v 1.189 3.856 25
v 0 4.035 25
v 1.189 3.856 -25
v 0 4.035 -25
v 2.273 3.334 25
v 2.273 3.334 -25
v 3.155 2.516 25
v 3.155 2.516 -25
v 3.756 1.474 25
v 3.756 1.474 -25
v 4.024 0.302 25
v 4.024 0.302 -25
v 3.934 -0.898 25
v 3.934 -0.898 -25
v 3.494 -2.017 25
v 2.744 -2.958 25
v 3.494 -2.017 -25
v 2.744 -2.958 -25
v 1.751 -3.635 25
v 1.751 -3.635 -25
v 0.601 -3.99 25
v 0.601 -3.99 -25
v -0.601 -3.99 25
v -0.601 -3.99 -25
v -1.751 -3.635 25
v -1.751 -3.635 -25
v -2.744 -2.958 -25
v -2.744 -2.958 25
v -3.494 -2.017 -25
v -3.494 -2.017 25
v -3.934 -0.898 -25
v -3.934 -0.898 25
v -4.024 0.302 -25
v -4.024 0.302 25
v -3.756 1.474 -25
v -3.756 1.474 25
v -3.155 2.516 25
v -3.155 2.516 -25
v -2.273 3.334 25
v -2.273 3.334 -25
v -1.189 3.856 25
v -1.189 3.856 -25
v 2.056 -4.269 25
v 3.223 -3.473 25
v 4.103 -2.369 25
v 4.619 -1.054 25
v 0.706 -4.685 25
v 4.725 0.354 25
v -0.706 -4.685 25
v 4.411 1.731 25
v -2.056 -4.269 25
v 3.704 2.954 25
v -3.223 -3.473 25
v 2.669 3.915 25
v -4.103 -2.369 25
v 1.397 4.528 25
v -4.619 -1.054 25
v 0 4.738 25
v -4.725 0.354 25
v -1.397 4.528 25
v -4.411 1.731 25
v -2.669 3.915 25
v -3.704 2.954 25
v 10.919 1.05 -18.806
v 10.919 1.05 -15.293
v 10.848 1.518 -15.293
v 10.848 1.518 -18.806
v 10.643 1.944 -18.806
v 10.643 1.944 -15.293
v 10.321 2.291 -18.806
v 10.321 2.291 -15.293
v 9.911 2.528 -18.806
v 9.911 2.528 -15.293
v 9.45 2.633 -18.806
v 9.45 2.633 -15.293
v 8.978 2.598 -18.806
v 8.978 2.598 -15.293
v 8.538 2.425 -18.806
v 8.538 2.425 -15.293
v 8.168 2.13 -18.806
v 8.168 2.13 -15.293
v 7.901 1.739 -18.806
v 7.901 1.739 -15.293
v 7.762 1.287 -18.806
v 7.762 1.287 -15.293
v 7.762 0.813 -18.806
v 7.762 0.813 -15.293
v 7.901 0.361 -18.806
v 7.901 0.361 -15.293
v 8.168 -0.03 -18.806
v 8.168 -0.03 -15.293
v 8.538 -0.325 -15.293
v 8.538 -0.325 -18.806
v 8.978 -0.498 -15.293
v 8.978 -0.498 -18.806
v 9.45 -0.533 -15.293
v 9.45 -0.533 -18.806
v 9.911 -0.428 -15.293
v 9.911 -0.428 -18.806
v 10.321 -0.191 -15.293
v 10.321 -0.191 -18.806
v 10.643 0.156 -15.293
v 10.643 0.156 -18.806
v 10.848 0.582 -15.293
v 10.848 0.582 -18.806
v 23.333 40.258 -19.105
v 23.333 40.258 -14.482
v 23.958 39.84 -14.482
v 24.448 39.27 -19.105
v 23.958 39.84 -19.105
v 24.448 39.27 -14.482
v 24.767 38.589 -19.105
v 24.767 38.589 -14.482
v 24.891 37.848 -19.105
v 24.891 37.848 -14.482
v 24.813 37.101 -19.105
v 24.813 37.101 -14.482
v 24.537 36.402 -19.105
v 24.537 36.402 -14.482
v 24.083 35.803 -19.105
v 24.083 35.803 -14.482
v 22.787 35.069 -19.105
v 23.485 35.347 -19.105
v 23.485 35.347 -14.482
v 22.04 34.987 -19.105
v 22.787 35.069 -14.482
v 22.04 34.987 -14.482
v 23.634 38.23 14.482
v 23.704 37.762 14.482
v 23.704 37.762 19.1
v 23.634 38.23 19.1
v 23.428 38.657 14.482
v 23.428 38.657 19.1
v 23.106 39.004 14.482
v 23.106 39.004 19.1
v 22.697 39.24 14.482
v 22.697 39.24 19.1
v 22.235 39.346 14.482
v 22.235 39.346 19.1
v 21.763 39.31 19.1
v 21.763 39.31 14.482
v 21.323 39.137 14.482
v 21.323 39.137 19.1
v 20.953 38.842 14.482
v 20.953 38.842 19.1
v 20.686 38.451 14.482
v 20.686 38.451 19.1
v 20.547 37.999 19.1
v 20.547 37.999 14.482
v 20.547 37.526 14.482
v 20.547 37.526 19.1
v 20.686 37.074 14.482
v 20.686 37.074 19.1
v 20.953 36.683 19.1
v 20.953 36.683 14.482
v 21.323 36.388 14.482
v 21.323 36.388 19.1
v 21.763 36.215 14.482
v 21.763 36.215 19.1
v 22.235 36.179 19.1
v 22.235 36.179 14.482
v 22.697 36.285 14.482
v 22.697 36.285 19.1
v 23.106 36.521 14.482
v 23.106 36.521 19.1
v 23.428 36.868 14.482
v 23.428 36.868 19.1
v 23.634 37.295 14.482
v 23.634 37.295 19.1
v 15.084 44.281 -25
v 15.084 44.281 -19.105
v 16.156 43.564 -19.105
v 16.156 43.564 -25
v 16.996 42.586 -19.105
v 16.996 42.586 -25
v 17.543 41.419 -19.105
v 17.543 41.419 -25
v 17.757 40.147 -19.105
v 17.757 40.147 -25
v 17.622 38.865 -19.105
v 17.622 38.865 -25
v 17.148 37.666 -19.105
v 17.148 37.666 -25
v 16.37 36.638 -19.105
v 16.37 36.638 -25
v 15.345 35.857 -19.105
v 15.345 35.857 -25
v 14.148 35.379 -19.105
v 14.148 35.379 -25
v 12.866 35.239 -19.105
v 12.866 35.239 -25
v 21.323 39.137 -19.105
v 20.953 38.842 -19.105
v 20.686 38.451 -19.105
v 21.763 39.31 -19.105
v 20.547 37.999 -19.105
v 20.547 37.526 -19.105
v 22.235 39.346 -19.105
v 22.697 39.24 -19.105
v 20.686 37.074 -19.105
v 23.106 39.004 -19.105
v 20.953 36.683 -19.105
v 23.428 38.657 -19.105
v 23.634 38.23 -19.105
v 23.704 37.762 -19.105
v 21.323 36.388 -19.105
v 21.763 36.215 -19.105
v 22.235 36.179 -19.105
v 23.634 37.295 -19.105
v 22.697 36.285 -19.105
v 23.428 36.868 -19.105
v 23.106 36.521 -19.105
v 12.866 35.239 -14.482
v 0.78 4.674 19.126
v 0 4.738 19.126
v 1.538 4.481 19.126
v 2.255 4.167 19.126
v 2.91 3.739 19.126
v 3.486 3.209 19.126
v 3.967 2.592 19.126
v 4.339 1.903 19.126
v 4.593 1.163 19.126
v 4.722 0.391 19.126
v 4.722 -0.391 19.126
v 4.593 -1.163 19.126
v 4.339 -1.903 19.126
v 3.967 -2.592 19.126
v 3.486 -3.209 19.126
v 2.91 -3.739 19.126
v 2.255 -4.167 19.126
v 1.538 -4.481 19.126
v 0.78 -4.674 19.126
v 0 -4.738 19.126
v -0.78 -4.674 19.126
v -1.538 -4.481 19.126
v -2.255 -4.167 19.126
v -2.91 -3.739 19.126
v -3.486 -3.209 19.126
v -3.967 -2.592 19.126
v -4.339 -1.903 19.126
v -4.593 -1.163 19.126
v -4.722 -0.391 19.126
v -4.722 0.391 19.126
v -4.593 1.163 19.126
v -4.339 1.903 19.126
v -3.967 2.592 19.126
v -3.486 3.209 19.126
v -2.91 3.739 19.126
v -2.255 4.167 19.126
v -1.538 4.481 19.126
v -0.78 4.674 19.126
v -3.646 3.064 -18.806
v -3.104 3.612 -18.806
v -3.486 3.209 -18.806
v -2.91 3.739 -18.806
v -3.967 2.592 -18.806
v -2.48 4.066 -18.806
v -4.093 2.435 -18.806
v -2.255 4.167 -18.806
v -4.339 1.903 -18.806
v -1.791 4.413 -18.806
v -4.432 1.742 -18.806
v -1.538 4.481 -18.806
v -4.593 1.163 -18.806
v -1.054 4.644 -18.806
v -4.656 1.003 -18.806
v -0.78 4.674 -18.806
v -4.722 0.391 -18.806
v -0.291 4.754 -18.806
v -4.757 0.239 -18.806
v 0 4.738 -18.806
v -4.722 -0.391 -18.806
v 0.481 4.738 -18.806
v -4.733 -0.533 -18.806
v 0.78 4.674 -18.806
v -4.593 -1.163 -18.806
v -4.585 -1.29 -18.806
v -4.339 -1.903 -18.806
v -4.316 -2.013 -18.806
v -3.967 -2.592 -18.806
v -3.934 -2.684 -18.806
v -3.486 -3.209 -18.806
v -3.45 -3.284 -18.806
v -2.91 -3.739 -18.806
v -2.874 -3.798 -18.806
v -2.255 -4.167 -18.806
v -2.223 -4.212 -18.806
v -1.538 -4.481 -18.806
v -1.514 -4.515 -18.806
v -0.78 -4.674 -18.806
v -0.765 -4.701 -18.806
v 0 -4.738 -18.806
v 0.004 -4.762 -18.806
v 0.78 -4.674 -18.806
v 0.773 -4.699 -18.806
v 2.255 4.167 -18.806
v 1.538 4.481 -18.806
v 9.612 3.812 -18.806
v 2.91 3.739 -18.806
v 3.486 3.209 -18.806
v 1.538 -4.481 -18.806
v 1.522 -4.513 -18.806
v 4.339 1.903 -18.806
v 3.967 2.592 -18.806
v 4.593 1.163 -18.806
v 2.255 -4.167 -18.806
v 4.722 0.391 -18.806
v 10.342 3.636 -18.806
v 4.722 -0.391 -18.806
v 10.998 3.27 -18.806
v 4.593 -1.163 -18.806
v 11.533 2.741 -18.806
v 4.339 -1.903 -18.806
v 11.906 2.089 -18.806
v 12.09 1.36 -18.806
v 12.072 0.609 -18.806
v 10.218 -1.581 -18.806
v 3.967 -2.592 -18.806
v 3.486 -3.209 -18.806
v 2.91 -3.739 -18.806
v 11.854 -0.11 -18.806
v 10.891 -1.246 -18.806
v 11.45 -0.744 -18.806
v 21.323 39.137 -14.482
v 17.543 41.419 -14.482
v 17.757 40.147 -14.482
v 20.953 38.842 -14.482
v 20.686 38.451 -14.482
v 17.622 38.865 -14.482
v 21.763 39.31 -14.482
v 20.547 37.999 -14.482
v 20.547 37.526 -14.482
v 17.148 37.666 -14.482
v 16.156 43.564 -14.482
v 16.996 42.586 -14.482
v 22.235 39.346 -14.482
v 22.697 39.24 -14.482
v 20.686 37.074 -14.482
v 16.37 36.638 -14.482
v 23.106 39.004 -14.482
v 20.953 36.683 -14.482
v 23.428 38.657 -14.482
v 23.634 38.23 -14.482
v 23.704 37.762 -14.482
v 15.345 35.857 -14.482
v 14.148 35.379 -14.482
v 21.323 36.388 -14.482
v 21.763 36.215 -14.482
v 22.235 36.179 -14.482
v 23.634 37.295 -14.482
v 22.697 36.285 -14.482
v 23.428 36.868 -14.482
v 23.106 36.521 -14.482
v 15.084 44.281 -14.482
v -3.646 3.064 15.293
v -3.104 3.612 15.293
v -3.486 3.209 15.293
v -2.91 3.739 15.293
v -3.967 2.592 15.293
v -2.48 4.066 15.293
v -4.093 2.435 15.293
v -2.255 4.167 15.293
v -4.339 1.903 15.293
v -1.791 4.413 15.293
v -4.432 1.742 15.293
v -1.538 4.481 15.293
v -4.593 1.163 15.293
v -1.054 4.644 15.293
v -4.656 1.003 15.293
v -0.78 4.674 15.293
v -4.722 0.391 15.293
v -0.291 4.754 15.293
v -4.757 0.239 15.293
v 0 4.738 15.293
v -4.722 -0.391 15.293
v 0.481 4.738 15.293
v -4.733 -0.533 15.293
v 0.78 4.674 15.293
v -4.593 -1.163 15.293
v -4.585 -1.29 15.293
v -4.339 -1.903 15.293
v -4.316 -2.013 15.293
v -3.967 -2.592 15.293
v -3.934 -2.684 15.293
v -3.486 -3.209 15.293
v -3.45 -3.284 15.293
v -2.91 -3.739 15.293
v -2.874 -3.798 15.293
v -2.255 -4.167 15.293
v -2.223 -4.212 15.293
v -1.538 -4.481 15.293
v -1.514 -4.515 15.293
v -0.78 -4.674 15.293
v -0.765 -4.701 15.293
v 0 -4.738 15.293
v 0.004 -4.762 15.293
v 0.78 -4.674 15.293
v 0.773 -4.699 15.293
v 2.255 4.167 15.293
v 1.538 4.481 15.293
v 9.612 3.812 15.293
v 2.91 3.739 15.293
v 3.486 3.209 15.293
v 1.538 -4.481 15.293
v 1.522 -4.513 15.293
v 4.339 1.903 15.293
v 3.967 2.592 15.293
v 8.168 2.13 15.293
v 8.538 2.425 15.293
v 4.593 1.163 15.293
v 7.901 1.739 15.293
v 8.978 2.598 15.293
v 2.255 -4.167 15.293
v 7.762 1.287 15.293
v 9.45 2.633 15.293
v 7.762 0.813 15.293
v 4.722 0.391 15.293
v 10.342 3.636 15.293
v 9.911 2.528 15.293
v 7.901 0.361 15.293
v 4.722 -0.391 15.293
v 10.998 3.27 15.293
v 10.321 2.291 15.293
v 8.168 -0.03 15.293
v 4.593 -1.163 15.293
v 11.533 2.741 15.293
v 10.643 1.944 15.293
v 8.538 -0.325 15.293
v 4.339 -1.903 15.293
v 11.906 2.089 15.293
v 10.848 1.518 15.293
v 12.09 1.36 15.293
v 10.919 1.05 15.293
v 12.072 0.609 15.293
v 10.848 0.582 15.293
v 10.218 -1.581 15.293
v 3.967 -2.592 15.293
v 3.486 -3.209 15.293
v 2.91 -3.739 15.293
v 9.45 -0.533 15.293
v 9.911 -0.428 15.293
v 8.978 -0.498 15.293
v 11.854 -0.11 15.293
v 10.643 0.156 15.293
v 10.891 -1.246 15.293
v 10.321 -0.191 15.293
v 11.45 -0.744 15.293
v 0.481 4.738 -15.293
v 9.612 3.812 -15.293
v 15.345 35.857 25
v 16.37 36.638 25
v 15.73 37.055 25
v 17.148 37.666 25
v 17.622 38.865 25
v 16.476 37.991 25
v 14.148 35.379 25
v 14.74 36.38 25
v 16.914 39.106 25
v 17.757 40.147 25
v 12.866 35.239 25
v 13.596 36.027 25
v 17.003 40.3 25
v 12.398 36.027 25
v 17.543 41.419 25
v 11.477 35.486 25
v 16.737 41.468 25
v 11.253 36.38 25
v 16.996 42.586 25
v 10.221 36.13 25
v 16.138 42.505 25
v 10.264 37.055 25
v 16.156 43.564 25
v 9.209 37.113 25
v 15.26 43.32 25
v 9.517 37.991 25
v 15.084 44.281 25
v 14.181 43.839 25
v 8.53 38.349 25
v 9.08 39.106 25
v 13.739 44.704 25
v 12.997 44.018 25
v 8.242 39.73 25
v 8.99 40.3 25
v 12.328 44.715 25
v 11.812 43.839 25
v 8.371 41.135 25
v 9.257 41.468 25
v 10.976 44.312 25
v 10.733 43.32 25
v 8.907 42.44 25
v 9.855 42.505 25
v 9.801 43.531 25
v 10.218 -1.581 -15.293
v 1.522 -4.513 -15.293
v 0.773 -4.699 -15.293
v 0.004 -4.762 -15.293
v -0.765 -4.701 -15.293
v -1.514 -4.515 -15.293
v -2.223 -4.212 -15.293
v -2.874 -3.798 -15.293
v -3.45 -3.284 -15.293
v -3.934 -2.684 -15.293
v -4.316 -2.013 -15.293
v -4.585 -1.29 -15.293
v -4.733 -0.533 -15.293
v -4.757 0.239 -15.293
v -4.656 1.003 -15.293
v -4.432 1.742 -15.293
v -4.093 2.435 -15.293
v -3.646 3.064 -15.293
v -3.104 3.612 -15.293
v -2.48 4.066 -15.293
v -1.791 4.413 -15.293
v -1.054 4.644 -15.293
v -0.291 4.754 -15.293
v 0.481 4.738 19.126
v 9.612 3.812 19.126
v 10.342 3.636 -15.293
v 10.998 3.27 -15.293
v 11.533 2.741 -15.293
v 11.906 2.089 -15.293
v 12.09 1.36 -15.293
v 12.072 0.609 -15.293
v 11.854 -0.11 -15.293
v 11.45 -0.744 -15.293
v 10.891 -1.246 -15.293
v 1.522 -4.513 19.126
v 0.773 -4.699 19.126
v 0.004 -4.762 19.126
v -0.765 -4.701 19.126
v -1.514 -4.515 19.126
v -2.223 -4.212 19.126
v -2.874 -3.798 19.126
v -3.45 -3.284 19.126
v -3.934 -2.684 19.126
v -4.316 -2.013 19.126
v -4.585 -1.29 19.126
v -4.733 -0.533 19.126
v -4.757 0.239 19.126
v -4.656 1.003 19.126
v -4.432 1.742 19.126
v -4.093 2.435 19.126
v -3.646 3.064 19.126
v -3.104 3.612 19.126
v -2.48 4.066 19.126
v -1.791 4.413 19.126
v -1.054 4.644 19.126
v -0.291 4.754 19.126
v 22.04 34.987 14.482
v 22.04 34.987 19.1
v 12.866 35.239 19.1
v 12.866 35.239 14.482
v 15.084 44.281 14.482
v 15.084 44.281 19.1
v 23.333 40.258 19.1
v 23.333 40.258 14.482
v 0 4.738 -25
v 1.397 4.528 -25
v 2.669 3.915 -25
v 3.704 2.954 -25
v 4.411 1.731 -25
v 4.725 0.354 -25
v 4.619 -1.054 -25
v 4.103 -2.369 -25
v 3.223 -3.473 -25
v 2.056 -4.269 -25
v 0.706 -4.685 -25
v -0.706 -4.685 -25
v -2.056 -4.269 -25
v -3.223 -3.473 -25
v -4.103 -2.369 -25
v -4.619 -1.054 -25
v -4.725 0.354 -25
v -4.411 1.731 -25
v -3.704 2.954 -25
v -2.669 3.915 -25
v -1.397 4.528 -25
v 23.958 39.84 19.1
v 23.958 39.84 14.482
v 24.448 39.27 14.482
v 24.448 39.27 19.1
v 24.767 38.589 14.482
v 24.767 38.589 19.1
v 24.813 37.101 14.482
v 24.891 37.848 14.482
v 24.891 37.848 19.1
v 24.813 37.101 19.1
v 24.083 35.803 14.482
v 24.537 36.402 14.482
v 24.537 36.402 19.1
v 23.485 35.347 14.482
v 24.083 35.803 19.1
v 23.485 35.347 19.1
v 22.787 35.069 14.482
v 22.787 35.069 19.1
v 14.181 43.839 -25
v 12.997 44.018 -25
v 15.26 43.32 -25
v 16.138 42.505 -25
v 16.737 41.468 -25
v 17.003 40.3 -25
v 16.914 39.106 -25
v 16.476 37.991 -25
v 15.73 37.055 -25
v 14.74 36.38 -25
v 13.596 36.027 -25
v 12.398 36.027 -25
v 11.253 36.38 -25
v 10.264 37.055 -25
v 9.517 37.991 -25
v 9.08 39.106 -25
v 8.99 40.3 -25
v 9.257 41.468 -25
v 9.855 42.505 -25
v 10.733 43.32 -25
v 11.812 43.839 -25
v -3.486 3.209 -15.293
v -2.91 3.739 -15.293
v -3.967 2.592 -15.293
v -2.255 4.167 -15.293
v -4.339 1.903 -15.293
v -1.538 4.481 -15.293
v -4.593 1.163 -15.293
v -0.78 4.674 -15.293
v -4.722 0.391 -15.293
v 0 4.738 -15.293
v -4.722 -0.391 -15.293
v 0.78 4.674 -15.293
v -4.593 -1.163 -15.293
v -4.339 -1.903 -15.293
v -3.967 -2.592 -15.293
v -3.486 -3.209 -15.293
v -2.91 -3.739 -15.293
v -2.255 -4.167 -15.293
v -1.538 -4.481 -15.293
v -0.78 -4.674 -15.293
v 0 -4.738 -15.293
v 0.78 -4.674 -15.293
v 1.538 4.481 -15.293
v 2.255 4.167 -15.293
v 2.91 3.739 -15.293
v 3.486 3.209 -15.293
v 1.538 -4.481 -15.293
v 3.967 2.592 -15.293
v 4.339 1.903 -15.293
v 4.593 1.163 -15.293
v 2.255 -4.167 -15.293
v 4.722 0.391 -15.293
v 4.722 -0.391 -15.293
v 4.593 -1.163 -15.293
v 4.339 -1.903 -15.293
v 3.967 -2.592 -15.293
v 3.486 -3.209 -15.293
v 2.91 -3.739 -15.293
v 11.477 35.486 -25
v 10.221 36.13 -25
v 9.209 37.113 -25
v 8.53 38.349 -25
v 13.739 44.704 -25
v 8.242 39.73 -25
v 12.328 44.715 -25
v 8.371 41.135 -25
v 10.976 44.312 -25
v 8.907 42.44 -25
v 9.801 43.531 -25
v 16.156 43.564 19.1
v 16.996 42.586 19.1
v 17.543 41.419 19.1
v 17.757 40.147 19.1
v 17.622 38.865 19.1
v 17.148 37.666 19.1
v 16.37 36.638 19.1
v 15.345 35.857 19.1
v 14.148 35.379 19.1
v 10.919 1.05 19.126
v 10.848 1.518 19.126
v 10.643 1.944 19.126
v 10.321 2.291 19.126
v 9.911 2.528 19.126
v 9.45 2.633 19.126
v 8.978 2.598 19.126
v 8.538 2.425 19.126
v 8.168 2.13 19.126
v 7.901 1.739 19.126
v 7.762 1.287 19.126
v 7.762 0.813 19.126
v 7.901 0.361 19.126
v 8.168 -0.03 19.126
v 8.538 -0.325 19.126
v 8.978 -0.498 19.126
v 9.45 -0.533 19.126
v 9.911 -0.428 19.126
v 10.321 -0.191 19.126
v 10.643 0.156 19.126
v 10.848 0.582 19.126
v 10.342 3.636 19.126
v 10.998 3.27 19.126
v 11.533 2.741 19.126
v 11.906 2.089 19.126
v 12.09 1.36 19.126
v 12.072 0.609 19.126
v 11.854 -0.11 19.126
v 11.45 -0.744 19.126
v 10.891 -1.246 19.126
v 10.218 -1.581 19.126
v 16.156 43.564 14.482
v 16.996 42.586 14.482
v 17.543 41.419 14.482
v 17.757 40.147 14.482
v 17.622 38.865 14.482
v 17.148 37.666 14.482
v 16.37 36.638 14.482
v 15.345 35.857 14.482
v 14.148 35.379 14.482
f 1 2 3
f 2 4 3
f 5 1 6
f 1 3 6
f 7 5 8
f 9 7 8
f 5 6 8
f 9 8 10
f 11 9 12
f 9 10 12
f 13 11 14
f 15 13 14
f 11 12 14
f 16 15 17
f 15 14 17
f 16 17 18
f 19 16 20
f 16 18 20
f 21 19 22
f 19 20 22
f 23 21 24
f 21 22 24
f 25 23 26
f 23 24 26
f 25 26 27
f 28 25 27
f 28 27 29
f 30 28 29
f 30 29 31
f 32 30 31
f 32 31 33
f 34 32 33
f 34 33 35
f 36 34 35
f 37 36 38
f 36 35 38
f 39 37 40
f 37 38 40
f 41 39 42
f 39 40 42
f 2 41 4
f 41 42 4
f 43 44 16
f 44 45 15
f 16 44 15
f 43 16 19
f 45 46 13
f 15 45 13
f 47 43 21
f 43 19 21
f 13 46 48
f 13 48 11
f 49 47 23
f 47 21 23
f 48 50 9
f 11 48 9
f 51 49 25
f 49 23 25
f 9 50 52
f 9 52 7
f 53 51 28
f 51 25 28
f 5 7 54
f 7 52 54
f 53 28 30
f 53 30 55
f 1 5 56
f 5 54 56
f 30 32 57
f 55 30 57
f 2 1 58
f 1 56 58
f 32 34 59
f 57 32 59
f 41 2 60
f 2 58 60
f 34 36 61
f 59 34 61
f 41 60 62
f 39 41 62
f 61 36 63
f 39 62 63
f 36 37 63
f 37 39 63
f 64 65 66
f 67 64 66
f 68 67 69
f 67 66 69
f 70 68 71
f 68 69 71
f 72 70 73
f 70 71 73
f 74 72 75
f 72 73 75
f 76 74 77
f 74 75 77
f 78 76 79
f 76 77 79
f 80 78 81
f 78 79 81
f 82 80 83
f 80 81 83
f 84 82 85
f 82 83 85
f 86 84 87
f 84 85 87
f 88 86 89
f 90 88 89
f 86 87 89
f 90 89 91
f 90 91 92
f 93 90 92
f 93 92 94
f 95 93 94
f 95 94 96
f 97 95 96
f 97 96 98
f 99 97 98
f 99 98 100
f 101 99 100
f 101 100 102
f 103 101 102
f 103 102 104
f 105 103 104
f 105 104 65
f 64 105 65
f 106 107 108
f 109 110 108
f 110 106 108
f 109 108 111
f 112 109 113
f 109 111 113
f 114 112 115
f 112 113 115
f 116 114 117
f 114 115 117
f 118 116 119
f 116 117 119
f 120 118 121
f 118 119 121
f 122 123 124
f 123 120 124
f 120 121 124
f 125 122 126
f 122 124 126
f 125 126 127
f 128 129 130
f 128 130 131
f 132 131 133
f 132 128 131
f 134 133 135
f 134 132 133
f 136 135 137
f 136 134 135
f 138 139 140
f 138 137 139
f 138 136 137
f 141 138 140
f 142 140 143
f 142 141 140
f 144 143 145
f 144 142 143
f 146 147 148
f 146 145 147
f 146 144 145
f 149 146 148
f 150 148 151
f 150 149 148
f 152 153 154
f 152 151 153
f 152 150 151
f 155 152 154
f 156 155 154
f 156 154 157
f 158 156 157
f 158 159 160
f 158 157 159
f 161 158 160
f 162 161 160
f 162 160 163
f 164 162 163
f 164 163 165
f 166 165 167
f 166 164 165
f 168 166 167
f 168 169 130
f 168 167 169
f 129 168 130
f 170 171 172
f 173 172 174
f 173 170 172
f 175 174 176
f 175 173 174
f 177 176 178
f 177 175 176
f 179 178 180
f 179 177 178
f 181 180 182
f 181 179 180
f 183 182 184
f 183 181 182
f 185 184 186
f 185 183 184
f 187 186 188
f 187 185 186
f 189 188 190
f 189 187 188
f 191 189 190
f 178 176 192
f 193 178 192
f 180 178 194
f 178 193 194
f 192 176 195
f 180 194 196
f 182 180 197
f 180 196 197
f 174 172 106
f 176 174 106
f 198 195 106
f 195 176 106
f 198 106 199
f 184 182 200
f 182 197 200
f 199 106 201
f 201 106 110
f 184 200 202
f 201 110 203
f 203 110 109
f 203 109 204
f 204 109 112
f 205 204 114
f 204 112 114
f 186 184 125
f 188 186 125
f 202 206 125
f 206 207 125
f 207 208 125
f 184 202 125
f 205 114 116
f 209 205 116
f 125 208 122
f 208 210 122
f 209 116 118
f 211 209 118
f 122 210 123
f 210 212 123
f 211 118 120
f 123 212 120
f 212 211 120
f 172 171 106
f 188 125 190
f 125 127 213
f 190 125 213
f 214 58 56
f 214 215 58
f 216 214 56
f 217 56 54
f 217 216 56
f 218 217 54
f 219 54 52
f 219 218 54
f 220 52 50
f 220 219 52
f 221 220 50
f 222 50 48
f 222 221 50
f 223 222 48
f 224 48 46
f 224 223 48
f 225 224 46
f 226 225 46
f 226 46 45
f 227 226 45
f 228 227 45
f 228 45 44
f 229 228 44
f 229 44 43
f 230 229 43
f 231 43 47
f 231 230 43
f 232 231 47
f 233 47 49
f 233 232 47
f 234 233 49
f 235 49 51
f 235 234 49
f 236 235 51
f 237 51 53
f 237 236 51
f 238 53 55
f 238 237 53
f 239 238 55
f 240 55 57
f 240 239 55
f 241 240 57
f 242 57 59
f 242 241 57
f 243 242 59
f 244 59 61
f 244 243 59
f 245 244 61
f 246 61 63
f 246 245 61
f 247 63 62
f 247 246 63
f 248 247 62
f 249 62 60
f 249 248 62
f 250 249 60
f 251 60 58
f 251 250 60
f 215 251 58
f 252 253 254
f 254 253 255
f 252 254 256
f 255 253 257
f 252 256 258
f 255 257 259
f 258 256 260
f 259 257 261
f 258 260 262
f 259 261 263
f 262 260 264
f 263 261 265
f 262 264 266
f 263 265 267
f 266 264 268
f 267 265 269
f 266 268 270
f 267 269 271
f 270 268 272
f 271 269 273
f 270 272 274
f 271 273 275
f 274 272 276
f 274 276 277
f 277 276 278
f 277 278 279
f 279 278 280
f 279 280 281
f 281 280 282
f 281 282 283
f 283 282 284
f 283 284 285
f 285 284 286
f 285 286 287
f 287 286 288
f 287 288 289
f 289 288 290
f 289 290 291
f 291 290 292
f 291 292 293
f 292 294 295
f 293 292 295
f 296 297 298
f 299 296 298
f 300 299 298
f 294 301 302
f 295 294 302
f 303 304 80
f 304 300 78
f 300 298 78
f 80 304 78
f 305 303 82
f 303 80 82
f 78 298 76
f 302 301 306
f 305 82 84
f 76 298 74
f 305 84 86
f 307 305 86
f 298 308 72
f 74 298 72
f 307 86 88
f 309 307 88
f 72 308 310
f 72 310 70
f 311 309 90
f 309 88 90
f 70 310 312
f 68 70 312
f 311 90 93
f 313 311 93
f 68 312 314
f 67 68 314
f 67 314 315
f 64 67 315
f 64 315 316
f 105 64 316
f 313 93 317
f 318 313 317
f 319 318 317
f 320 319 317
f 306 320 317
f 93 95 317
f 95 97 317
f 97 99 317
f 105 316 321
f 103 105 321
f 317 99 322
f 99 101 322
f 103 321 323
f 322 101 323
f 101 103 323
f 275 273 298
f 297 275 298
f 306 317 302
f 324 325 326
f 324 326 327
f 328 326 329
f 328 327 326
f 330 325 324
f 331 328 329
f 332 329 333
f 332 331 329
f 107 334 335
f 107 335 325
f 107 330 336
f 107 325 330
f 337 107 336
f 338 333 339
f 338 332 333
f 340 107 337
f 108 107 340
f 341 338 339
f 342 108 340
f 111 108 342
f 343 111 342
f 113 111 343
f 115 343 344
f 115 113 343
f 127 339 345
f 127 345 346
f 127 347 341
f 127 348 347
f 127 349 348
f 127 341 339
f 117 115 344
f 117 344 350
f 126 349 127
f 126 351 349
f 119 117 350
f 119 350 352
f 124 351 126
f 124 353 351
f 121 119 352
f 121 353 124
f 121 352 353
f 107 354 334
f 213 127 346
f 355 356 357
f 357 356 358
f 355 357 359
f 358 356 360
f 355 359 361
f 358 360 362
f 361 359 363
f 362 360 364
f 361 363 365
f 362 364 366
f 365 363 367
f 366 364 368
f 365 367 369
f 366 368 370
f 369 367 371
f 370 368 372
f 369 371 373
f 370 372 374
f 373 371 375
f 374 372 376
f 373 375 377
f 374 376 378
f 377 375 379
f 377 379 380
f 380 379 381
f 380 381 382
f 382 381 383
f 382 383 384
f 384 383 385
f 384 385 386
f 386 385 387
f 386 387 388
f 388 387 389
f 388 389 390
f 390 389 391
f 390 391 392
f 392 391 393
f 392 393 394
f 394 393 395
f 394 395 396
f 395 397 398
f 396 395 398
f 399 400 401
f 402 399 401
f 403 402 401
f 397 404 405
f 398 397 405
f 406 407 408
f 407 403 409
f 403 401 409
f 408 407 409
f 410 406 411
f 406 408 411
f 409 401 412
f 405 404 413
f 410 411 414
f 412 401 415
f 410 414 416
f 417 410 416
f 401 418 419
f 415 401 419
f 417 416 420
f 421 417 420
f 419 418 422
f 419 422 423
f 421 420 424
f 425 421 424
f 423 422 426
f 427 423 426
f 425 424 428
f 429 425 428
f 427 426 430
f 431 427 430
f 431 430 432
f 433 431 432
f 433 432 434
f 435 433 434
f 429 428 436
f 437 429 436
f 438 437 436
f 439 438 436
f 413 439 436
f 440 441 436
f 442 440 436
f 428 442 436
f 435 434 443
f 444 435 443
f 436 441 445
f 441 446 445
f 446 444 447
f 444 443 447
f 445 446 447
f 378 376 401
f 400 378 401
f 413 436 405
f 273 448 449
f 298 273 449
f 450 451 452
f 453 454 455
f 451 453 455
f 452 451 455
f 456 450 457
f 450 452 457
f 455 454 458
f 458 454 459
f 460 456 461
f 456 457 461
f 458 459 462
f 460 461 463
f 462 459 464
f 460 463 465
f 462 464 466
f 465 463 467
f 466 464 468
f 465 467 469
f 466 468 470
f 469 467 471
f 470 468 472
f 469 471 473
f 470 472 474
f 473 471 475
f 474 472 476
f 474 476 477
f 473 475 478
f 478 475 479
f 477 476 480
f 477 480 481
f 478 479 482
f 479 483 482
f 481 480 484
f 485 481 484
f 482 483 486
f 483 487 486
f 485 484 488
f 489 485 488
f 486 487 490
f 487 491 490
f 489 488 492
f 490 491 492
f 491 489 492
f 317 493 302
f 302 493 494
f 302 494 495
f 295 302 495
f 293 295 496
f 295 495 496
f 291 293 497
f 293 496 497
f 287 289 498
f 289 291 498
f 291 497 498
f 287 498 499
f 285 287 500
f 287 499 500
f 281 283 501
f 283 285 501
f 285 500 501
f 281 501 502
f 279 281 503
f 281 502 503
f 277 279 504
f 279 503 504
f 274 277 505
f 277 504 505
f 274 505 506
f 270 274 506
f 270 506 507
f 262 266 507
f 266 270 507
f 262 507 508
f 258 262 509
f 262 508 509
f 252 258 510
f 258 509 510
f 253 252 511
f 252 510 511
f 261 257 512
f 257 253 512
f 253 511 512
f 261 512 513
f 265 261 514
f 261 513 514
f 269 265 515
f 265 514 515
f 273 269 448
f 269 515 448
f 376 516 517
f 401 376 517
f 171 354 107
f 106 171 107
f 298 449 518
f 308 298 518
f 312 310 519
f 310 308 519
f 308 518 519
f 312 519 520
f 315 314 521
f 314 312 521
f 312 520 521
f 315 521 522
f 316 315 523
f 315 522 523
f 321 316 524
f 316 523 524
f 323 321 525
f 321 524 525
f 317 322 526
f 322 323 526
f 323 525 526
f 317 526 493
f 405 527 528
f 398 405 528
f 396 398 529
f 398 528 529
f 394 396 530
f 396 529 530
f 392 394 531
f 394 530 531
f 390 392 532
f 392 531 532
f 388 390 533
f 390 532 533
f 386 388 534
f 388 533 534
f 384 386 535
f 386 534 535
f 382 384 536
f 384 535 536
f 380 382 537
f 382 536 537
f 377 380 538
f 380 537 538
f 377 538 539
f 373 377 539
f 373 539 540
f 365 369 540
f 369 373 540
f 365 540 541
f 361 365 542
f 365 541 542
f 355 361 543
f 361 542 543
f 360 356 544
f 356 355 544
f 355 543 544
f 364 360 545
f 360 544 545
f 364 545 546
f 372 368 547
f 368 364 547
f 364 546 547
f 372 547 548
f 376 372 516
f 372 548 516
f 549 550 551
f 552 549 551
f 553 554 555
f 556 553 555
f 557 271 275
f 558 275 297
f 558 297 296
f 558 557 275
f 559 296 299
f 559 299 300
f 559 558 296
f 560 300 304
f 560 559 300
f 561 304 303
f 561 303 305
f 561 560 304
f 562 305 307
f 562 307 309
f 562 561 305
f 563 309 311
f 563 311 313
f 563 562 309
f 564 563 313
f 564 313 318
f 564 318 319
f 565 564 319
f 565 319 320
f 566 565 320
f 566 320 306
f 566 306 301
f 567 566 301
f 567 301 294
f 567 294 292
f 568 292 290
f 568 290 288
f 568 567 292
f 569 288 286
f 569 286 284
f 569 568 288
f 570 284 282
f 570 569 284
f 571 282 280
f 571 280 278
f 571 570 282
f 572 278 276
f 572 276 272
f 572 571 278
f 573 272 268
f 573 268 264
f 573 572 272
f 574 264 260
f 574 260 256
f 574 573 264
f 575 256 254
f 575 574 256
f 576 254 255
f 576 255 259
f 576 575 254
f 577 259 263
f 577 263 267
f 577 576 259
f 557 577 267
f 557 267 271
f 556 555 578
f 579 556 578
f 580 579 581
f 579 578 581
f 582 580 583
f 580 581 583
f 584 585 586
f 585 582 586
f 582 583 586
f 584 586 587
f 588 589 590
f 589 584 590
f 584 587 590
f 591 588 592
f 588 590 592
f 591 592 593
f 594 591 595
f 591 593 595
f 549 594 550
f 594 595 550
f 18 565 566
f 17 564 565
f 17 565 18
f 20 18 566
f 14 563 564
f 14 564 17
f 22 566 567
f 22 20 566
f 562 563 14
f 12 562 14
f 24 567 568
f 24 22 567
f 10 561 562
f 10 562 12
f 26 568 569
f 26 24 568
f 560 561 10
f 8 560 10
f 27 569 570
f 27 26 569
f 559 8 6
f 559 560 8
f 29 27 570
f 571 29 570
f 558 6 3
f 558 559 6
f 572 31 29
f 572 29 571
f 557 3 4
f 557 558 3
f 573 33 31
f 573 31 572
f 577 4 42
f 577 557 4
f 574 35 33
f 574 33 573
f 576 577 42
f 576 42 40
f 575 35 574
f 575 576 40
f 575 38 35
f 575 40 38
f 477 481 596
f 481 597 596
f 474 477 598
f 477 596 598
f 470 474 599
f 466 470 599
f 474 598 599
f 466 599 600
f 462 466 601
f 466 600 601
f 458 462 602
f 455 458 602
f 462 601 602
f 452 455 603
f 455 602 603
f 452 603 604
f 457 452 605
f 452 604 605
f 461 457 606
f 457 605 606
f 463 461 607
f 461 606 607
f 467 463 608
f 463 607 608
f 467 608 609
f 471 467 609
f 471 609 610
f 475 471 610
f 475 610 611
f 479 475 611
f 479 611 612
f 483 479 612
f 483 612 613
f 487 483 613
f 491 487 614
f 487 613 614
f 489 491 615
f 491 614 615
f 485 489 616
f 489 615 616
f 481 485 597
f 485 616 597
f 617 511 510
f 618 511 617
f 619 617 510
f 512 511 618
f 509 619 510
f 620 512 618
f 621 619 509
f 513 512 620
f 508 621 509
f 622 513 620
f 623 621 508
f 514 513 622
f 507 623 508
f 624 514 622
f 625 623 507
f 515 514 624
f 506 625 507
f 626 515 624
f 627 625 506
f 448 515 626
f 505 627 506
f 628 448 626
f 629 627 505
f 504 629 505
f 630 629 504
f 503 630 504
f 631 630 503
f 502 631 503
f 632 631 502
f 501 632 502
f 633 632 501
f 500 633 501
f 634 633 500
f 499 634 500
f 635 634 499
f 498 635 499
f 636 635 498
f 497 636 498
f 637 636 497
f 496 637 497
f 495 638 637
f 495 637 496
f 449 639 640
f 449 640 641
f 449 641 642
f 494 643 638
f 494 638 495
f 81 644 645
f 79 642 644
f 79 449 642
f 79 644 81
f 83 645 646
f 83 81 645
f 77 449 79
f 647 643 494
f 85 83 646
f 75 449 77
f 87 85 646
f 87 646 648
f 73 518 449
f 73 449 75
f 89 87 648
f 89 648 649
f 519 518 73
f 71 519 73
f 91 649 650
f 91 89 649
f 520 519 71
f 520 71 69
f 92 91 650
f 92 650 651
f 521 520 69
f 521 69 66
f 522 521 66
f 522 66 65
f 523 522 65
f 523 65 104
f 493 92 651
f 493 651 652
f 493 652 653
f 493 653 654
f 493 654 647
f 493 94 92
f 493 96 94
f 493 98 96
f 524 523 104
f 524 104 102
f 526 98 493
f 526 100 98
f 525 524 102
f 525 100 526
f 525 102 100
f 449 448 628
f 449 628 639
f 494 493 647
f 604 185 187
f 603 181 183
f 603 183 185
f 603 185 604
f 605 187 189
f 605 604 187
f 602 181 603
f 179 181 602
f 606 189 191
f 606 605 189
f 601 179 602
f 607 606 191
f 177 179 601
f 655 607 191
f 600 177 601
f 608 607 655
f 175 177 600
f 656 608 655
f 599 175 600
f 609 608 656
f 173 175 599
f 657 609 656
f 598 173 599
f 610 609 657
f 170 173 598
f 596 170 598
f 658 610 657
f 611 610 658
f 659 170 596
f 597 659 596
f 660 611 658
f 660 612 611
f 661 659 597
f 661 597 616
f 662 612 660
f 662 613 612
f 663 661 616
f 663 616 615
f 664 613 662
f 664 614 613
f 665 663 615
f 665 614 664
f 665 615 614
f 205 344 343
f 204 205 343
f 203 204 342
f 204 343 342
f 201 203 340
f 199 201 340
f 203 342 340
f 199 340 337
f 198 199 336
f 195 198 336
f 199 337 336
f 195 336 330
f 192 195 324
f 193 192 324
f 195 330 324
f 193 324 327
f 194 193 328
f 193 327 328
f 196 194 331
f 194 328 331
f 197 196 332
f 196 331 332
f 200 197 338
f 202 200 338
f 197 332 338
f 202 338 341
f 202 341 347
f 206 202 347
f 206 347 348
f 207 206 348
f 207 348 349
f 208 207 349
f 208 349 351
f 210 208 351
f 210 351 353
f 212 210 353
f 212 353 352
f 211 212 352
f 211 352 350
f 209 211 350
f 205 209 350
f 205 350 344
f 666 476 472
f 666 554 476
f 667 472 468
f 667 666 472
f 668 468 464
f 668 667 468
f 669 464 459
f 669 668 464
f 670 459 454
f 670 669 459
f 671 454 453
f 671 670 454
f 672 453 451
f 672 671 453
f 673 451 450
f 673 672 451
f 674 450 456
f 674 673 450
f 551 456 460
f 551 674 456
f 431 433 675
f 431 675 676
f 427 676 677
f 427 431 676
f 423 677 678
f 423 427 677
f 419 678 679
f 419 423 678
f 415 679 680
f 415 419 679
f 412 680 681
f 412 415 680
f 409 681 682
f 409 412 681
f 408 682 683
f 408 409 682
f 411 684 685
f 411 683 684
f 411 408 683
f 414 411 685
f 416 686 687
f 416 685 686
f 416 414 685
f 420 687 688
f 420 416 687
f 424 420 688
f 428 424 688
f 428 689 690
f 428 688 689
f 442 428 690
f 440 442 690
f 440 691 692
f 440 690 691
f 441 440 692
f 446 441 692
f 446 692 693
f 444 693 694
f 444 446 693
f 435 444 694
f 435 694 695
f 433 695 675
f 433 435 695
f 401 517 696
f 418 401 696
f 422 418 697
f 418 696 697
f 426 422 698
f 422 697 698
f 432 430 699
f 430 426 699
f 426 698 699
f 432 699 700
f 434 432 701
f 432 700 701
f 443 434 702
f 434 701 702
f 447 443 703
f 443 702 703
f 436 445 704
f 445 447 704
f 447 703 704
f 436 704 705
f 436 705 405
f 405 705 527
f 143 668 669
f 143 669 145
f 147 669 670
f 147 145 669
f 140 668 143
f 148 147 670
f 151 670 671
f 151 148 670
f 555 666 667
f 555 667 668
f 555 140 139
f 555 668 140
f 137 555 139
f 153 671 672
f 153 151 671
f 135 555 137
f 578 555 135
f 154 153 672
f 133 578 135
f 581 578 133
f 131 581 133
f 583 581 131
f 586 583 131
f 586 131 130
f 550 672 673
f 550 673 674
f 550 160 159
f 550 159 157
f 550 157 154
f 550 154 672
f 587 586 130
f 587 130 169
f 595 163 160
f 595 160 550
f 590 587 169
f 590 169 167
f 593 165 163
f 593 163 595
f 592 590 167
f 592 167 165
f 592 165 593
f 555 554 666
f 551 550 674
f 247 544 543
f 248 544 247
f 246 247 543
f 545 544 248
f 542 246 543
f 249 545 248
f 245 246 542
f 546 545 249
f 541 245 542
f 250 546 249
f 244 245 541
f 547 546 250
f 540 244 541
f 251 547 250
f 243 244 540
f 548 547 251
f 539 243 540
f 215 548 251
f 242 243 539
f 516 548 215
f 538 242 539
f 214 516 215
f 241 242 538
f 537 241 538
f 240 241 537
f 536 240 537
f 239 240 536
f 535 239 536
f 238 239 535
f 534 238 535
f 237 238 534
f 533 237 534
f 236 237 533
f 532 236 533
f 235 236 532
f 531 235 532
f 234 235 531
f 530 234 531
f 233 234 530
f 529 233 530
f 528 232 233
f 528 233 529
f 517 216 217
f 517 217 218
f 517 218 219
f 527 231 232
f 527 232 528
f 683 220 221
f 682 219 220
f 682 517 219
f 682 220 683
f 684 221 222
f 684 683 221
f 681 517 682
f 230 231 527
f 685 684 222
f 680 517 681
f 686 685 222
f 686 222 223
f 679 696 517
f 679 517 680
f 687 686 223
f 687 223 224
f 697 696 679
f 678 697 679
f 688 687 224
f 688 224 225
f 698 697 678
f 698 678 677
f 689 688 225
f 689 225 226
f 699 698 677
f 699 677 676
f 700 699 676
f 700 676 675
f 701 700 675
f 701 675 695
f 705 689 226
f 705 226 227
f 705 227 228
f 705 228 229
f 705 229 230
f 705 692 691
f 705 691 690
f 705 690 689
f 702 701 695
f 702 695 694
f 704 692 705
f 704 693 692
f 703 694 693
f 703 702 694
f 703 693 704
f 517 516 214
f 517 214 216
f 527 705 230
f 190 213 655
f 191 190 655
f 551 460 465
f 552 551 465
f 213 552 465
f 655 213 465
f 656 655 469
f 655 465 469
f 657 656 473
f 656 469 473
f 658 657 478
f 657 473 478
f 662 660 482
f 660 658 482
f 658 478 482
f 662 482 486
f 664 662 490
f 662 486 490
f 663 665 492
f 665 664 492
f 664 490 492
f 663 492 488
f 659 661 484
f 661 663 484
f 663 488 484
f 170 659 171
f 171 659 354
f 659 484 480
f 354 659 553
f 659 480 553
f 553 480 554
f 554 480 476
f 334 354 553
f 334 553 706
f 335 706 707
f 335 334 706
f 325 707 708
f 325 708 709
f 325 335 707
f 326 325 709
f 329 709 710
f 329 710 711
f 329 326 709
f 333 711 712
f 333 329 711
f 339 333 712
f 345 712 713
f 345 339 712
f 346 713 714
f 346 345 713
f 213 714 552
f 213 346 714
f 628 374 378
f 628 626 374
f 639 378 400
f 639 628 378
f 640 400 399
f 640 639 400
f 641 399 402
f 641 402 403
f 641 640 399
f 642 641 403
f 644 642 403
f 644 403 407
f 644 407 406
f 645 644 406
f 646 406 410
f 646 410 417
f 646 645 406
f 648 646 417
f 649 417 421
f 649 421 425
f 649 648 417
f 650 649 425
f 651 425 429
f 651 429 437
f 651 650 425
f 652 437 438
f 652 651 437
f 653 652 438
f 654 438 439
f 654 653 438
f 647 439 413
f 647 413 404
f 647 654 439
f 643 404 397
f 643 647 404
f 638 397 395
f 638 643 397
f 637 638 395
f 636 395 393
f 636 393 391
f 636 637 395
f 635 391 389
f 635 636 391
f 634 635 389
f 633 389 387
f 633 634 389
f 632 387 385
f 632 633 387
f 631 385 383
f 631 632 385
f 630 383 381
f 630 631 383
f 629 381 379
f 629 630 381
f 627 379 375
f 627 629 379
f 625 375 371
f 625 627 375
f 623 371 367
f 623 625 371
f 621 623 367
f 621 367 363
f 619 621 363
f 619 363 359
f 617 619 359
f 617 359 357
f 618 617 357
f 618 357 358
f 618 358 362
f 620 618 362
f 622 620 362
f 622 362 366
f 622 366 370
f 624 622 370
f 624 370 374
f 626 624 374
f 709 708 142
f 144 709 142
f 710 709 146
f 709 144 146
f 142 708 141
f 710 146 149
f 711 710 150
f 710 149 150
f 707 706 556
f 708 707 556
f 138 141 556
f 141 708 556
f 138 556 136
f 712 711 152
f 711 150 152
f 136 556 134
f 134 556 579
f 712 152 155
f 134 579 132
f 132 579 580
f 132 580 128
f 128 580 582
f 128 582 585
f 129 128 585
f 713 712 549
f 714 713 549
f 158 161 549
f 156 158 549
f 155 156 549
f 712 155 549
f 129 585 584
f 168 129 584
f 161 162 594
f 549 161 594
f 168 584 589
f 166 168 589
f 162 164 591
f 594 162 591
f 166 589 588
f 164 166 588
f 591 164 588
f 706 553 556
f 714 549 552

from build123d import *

# Parameters (mm, degrees)
BOSS_EXTRUDE1_DEPTH        = 25
BOSS_EXTRUDE1_DEPTH_BACK   = 25
SKETCH1_R                  = 1.5875
BOSS_EXTRUDE1_2_DEPTH      = 25
BOSS_EXTRUDE1_2_DEPTH_BACK = 25
SKETCH2_W                  = 30.585034638
SKETCH2_H                  = 9.810796571
SKETCH2_W_2                = 15.470183673
SKETCH2_W_3                = 13.851963624
SKETCH2_W_4                = 109.14073621
SKETCH2_H_2                = 4.034989958
SKETCH3_W                  = 28.963004802
SKETCH3_H                  = 14.709213774
SKETCH3_W_2                = 10.915618027
SKETCH3_W_3                = 10.243887687
SKETCH3_W_4                = 54.667422542
SKETCH3_H_2                = 4.017882111


with BuildPart() as part:
    # Sketch1 → Boss-Extrude1 (new, two sides: drawn at the far end of the back side and taken through both)
    with BuildSketch(Plane.XY.offset(-BOSS_EXTRUDE1_DEPTH_BACK)):
        with BuildLine():
            Line((9.61151388, 3.811971952), (0.480629395, 4.738185479))
            ThreePointArc((0.480629395, 4.738185479), (-4.732630614, -0.532553957), (1.521633661, -4.512874611))
            Line((1.521633661, -4.512874611), (10.21832503, -1.580557747))
            ThreePointArc((10.21832503, -1.580557747), (12.090045273, 1.36046989), (9.61151388, 3.811971952))
        make_face()
        with Locations((9.331350497, 1.050039193)):
            Circle(SKETCH1_R, mode=Mode.SUBTRACT)
    extrude(amount=BOSS_EXTRUDE1_DEPTH + BOSS_EXTRUDE1_DEPTH_BACK)

    # Sketch2 → Cut-Revolve1 (revolve, cut)
    with BuildSketch(Plane(origin=(0, 0, 0), x_dir=(0, 0, -1), z_dir=(1, 0, 0))):
        with Locations((0, 9.643583765)):
            Rectangle(SKETCH2_W, SKETCH2_H)
        with Locations((-26.860610177, 9.643583765)):
            Rectangle(SKETCH2_W_2, SKETCH2_H)
        with Locations((25.731541433, 9.643583765)):
            Rectangle(SKETCH2_W_3, SKETCH2_H)
        with Locations((0, 2.017494979)):
            Rectangle(SKETCH2_W_4, SKETCH2_H_2)
    revolve(axis=Axis((0, 0, 35.414629517), (0, 0, -1)), mode=Mode.SUBTRACT)


with BuildPart() as body_2:
    # Sketch1 → Boss-Extrude1 2 (new, two sides: drawn at the far end of the back side and taken through both)
    with BuildSketch(Plane.XY.offset(-BOSS_EXTRUDE1_2_DEPTH_BACK)):
        with BuildLine():
            Line((23.333418199, 40.257686297), (15.084349744, 44.28059477))
            ThreePointArc((15.084349744, 44.28059477), (8.371465163, 41.134811127), (12.866089587, 35.239293727))
            Line((12.866089587, 35.239293727), (22.040373547, 34.987427114))
            ThreePointArc((22.040373547, 34.987427114), (24.812702769, 37.100995404), (23.333418199, 40.257686297))
        make_face()
        with Locations((22.11655879, 37.762487454)):
            Circle(SKETCH1_R, mode=Mode.SUBTRACT)
    extrude(amount=BOSS_EXTRUDE1_2_DEPTH + BOSS_EXTRUDE1_2_DEPTH_BACK)

    # Sketch3 → Cut-Revolve2 (revolve, cut)
    with BuildSketch(Plane(origin=(12.996787849, 0, 0), x_dir=(0, 0, -1), z_dir=(1, 0, 0))):
        with Locations((0, 52.117106887)):
            Rectangle(SKETCH3_W, SKETCH3_H)
        with Locations((-24.557457504, 52.117106887)):
            Rectangle(SKETCH3_W_2, SKETCH3_H)
        with Locations((24.226958448, 52.117106887)):
            Rectangle(SKETCH3_W_3, SKETCH3_H)
        with Locations((0, 42.008941056)):
            Rectangle(SKETCH3_W_4, SKETCH3_H_2)
    revolve(axis=Axis((12.996787849, 40, 0), (0, 0, -1)), mode=Mode.SUBTRACT)


solid = Compound([part.part, body_2.part])
